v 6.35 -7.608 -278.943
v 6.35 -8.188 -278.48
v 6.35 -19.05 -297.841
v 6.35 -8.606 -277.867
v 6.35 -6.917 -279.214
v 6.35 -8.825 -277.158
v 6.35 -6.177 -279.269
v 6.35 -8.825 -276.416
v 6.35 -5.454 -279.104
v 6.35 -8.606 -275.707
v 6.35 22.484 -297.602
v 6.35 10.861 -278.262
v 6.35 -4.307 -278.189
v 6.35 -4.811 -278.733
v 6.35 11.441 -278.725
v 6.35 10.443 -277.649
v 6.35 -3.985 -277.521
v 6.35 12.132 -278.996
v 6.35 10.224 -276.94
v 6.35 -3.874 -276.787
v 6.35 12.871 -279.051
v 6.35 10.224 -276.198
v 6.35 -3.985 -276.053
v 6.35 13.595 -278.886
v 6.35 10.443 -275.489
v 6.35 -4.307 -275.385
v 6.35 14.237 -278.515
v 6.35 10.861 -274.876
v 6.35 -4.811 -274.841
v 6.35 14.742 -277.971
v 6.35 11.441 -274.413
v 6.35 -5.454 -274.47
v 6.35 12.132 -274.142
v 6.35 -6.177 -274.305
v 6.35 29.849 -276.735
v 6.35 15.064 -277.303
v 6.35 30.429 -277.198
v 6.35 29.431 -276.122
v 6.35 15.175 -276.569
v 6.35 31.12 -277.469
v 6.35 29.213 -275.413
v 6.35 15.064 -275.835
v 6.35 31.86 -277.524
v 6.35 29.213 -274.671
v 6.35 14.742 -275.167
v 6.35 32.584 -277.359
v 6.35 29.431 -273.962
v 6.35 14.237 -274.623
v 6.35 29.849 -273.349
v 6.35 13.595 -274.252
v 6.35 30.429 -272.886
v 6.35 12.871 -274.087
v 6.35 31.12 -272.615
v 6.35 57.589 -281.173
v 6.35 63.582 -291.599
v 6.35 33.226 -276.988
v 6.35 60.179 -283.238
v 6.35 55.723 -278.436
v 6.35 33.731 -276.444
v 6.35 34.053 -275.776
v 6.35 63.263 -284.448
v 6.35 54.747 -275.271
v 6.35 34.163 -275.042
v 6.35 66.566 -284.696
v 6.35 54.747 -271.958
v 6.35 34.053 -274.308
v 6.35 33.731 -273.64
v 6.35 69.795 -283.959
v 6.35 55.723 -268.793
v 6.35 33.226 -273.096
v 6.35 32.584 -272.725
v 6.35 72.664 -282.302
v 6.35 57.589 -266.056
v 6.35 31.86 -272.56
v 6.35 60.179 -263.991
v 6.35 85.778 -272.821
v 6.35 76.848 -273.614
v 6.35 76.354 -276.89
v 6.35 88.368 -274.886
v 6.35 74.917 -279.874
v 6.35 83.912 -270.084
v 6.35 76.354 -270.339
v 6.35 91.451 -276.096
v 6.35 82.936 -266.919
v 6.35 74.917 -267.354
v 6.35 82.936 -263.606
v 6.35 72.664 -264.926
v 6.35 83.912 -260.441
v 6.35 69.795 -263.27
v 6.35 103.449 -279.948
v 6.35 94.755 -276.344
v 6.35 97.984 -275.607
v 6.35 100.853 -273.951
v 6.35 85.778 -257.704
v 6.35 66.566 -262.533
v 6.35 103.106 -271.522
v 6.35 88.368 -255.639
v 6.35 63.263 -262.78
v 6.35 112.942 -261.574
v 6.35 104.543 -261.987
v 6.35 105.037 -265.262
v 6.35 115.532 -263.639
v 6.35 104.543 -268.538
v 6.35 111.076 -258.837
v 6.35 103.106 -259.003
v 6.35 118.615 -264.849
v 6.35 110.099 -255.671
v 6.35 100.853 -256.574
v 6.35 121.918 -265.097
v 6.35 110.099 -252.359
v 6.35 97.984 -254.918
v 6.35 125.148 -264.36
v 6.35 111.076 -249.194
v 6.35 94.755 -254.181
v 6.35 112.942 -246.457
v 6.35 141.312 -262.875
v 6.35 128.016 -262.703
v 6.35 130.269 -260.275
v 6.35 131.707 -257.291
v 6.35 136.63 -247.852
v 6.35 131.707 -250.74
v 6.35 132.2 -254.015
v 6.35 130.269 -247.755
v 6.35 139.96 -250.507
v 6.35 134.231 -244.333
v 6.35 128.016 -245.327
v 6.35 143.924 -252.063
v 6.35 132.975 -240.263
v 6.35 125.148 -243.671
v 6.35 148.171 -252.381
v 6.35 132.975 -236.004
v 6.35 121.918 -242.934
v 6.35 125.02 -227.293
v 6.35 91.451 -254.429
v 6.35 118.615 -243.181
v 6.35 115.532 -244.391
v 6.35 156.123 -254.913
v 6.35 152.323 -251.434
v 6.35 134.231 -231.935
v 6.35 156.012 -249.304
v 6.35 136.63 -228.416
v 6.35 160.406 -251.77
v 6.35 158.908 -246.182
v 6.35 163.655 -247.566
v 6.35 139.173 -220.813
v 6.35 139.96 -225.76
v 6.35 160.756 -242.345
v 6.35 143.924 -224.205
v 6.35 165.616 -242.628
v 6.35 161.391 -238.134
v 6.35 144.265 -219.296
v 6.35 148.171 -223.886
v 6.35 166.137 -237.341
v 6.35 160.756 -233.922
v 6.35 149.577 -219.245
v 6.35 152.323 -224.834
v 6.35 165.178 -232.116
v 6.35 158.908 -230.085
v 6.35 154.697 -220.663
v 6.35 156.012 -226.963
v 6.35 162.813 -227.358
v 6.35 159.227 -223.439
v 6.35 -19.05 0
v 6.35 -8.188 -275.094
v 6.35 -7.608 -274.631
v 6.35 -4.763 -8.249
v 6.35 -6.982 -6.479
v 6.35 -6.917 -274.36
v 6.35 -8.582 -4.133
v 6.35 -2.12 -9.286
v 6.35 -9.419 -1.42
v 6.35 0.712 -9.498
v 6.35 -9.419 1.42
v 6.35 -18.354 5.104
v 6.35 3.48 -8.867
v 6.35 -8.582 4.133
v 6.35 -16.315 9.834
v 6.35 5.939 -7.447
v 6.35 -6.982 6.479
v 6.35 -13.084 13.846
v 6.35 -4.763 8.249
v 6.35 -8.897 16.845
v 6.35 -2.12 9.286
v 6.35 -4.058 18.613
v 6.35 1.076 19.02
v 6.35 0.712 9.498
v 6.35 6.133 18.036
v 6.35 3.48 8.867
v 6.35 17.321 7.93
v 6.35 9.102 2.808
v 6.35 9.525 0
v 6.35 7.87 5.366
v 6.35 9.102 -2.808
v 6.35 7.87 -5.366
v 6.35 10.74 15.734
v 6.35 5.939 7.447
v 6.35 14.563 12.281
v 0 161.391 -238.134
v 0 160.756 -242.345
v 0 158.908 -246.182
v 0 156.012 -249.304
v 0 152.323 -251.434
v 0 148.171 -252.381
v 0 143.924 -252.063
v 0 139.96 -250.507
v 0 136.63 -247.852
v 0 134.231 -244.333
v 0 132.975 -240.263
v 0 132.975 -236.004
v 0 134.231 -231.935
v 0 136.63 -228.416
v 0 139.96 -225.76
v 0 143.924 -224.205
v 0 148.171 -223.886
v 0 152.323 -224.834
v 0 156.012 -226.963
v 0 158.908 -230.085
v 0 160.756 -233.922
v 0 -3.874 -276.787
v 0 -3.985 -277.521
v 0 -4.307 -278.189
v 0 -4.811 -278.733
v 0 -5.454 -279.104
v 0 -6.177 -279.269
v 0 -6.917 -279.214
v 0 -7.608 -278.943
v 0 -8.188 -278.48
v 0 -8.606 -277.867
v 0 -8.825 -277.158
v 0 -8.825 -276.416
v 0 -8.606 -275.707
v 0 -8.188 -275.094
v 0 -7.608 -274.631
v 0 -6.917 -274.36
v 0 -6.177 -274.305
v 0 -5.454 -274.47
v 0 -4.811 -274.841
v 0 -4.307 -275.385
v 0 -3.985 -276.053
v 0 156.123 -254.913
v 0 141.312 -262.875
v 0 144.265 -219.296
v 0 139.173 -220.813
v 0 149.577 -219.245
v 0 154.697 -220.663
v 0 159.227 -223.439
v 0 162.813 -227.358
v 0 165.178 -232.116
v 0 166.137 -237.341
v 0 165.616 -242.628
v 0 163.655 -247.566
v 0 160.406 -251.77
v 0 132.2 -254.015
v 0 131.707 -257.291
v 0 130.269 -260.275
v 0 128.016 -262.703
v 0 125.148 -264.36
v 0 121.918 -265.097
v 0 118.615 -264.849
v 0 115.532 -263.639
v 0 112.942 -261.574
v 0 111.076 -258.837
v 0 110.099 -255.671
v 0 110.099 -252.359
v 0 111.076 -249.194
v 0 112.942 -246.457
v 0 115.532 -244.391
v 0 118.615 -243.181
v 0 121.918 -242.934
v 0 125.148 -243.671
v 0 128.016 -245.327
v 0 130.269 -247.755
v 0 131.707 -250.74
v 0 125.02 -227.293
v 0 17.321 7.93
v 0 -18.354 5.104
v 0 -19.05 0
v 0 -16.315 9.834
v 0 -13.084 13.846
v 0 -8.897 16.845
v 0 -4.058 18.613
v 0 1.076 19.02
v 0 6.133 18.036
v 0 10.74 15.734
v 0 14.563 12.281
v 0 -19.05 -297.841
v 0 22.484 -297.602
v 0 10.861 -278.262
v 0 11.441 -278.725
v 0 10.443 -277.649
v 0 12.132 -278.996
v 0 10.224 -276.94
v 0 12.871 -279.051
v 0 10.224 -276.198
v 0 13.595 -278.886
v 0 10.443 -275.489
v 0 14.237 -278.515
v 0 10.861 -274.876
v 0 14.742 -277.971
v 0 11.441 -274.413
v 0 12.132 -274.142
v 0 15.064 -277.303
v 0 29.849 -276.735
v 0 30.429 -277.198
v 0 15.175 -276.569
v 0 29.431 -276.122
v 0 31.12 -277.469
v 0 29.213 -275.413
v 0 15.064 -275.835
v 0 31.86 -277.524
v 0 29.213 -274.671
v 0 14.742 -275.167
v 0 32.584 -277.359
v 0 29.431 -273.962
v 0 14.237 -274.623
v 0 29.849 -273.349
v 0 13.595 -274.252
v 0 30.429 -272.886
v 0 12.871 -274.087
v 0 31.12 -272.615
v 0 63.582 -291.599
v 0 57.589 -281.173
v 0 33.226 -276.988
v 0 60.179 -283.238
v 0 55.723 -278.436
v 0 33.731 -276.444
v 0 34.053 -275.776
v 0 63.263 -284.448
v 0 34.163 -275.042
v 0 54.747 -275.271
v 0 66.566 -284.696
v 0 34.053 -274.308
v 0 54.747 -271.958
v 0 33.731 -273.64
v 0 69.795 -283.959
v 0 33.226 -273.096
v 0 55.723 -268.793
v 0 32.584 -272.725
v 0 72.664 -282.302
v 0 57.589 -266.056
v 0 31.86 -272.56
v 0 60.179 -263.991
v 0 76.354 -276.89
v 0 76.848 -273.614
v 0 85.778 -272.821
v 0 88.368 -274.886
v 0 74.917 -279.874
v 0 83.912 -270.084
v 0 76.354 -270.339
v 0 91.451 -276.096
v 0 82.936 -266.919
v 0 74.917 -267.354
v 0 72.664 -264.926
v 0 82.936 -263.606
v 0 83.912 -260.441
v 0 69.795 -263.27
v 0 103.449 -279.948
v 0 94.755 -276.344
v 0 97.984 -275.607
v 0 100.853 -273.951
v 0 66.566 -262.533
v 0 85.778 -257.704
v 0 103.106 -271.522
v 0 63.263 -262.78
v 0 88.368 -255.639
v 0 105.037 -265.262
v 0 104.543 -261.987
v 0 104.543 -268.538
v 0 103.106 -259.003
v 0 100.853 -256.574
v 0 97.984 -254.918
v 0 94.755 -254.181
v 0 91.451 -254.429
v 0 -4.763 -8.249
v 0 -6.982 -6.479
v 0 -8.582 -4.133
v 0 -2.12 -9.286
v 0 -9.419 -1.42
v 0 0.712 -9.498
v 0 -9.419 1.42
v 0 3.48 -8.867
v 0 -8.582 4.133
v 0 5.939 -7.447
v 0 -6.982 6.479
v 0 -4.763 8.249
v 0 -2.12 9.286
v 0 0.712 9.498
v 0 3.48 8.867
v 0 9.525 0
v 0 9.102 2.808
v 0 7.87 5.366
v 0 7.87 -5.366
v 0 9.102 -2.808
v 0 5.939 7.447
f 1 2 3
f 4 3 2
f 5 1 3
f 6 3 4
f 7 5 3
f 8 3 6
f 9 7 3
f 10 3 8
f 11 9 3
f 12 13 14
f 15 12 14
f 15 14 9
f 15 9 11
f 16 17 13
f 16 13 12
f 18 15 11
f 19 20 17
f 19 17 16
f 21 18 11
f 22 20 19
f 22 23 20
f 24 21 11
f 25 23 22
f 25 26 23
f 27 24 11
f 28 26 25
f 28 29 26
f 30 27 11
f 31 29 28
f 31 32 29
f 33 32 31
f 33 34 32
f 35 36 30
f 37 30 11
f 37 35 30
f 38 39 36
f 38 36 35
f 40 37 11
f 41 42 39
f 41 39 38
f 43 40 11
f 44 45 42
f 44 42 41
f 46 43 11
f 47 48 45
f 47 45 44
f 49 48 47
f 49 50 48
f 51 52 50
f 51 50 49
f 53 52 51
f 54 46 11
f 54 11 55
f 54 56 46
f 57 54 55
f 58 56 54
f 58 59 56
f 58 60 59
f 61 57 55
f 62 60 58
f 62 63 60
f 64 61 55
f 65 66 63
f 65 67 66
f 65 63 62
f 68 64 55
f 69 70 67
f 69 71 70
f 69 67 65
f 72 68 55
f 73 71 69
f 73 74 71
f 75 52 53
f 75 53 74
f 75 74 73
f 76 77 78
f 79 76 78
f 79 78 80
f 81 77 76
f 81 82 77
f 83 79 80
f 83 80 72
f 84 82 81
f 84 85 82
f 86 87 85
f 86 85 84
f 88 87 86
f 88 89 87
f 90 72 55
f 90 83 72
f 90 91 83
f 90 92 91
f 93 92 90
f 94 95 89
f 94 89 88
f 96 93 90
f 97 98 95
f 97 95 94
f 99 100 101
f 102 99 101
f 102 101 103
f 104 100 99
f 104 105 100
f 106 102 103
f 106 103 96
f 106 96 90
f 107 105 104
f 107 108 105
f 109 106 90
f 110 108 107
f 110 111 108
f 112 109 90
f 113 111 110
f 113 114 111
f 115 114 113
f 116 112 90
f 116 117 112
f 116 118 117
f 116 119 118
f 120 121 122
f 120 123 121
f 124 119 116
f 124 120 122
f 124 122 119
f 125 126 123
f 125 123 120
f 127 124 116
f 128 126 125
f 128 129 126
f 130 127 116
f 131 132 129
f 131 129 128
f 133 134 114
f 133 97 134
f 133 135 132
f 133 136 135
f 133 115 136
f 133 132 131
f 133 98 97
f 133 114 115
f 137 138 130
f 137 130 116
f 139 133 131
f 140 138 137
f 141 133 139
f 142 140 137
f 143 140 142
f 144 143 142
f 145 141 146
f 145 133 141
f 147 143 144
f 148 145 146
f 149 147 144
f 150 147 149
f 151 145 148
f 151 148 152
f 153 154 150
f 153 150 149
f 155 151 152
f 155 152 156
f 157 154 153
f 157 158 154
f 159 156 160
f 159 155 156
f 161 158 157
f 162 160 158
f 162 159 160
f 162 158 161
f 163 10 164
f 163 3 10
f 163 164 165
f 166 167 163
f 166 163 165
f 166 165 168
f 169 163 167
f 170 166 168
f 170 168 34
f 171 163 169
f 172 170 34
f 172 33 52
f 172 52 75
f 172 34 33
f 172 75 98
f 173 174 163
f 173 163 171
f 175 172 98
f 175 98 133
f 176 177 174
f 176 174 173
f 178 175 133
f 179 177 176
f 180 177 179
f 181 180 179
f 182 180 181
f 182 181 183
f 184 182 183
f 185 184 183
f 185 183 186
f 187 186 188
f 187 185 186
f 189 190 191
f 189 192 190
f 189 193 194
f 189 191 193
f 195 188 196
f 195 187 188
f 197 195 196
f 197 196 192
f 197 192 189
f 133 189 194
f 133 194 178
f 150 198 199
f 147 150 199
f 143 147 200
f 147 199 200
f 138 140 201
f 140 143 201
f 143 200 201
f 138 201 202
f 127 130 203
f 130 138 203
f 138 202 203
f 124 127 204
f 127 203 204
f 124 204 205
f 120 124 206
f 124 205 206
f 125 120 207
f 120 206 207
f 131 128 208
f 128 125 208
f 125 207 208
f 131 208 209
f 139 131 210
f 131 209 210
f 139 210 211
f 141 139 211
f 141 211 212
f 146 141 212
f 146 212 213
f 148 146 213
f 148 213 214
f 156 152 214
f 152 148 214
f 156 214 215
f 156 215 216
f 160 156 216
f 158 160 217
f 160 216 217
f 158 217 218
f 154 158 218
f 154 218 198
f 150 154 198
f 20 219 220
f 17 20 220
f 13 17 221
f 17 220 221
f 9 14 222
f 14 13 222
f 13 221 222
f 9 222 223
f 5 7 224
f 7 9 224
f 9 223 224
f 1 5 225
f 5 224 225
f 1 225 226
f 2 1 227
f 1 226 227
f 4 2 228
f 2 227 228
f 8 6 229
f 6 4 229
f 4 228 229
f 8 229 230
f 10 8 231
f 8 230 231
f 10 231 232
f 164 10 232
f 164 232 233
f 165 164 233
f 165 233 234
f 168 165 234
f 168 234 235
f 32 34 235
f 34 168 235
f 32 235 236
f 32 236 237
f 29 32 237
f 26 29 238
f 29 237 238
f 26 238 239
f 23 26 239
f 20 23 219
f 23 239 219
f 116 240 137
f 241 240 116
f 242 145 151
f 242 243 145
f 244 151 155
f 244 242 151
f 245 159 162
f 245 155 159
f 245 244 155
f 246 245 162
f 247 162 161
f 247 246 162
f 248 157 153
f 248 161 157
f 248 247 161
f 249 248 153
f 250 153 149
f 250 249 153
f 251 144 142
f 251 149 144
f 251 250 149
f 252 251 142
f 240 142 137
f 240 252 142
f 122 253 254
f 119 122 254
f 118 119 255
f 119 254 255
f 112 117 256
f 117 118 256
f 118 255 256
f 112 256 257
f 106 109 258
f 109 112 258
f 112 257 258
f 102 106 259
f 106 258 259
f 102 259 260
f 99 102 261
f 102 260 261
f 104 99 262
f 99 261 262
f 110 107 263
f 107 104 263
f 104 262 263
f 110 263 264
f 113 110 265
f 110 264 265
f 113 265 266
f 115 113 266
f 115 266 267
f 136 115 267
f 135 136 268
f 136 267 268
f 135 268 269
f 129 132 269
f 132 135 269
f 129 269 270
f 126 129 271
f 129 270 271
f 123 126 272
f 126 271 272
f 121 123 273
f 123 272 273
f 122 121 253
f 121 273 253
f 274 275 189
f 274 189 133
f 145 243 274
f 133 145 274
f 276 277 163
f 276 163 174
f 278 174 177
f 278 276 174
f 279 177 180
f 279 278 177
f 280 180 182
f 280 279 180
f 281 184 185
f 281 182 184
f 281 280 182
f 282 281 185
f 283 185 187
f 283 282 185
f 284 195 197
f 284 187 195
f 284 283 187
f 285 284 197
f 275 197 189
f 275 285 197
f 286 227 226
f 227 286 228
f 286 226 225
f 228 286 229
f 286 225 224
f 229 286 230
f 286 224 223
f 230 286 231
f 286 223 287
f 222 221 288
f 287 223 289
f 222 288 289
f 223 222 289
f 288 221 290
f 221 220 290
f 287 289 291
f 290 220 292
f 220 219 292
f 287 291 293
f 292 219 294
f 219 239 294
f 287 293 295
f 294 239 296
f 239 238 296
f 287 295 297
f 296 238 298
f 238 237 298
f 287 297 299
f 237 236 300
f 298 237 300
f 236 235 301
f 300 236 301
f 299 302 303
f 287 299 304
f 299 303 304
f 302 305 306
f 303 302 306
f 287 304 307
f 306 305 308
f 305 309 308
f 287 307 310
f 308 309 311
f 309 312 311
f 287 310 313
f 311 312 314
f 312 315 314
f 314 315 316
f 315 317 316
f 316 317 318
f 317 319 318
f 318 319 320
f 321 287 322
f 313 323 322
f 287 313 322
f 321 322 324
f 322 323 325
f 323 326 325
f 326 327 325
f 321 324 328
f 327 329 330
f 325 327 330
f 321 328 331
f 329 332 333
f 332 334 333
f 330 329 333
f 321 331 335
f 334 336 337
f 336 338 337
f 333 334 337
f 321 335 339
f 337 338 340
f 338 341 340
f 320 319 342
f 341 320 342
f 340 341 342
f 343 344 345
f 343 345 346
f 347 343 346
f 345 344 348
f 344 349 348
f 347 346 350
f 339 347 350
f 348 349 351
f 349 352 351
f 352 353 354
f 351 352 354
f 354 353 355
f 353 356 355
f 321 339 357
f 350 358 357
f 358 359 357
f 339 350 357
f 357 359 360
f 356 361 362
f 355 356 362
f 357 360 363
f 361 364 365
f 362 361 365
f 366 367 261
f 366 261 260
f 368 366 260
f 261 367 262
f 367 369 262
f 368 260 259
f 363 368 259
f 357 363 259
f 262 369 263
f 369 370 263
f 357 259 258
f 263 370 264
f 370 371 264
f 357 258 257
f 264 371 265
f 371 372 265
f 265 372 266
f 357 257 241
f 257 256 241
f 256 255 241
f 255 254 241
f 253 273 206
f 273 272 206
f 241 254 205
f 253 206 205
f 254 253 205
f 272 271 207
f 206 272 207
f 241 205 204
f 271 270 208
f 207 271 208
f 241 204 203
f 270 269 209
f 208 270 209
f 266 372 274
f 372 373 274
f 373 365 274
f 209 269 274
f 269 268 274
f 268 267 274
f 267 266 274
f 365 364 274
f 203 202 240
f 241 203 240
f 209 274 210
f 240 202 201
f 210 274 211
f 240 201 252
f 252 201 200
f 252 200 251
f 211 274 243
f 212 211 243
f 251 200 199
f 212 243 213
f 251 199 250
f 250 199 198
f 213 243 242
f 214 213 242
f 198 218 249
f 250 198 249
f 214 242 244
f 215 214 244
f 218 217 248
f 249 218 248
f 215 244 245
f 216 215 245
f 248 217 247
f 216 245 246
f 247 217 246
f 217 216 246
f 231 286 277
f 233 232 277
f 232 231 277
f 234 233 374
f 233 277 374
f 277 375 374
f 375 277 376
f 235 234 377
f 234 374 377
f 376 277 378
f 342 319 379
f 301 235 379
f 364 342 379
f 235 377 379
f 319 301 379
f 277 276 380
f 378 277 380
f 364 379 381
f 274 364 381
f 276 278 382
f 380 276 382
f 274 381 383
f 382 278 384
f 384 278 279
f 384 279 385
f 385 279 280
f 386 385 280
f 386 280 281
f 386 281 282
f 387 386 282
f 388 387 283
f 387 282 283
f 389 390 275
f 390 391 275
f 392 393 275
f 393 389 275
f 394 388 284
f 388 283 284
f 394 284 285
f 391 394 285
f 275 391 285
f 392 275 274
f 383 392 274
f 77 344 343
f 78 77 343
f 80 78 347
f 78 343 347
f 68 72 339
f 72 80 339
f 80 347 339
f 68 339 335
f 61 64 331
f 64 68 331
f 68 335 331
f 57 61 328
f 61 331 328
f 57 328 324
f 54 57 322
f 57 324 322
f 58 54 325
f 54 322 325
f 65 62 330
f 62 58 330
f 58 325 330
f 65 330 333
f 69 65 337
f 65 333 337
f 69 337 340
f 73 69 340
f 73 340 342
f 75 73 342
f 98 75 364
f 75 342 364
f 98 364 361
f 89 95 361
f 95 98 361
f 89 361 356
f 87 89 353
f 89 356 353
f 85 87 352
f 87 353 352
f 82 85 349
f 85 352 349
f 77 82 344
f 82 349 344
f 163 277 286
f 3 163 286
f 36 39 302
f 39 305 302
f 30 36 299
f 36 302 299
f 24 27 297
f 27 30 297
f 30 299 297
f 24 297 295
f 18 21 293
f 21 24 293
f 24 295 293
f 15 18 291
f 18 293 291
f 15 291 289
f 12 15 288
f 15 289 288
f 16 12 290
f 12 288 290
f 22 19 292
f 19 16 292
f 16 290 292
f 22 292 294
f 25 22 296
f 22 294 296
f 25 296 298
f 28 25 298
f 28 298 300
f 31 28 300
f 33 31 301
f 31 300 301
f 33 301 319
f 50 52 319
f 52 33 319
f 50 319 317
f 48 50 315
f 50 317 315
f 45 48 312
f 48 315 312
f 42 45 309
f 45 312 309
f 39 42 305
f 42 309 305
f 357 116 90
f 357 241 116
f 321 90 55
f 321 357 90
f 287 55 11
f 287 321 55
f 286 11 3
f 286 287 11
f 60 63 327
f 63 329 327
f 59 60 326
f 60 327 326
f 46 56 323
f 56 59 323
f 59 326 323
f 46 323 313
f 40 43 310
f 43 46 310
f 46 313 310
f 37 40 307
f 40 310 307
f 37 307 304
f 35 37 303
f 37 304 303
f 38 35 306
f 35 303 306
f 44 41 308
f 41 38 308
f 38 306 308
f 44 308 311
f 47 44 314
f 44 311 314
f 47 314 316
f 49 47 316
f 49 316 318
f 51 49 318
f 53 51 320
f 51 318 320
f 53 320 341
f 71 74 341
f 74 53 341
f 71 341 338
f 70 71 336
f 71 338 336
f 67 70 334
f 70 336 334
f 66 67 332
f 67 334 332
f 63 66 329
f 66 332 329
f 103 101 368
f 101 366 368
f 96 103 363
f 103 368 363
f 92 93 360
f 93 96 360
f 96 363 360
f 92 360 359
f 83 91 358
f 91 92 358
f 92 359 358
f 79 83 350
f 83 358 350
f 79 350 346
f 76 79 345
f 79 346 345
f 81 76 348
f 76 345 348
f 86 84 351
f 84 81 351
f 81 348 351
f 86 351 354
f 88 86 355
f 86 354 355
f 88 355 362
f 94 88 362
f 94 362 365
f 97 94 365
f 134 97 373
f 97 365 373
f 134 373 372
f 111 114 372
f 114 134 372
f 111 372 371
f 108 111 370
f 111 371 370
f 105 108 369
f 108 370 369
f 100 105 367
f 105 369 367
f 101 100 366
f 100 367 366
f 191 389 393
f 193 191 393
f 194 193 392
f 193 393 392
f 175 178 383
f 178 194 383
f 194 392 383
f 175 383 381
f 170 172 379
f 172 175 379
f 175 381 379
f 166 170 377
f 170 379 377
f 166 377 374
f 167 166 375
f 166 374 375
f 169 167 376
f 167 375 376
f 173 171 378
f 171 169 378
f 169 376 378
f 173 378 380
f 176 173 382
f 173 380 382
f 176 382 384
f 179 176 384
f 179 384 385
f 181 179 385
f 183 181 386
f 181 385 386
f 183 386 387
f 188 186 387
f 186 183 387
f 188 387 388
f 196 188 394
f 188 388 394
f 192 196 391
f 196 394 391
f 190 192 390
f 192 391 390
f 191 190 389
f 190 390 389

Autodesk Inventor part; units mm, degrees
ref_plane "YZ Plane" through (0, 0, 0) normal (1, 0, 0) x (0, 1, 0)
ref_plane "XZ Plane" through (0, 0, 0) normal (0, 1, 0) x (-1, 0, 0)
ref_plane "XY Plane" through (0, 0, 0) normal (0, 0, 1) x (1, 0, 0)
sketch "Sketch1" plane through (0, 0, 0) normal (1, 0, 0) x (0, 1, 0)
  circle A0 centre (0, 0) radius 9.525
  arc A1 (-25.1608, -265.5105) -> (128.0642, -233.9411) centre (0, 0) ccw construction
  arc A2 (17.3208, 7.9305) -> (-19.05, 0) centre (0, 0) ccw
  line L0 (-19.05, 0) -> (-19.05, -297.8414)
  circle A3 centre (121.0878, -254.0152) radius 14.7 construction
  circle A4 centre (93.9242, -265.2625) radius 14.7 construction
  circle A5 centre (65.7355, -273.6143) radius 14.7 construction
  circle A6 centre (121.0878, -254.0152) radius 11.1125
  circle A7 centre (93.9242, -265.2625) radius 11.1125
  circle A8 centre (65.7355, -273.6143) radius 11.1125
  circle A9 centre (121.0878, -254.0152) radius 12.7 construction
  circle A10 centre (93.9242, -265.2625) radius 12.7 construction
  circle A11 centre (65.7355, -273.6143) radius 12.7 construction
  line L1 (17.3208, 7.9305) -> (125.0203, -227.293)
  arc A12 (-19.05, -276.2038) -> (132.3042, -243.2017) centre (0, 0) ccw construction
  arc A13 (-19.05, -297.8414) -> (141.312, -262.8751) centre (0, 0) ccw
  circle A14 centre (31.6741, -275.0422) radius 2.4892
  circle A15 centre (12.6854, -276.5692) radius 2.4892
  circle A16 centre (-6.3634, -276.7869) radius 2.4892
  arc A17 (-19.05, -286.3871) -> (136.5435, -252.4606) centre (0, 0) ccw construction
  line L2 (0, 0) -> (8.0964, -266.5771) construction
  line L3 (8.4048, -276.7324) -> (8.7133, -286.8877) construction
  line L4 (8.4048, -276.7324) -> (8.0964, -266.5771) construction
  line L5 (51.0397, -273.9694) -> (31.6741, -275.0422) construction
  line L6 (48.6698, -262.2215) -> (54.4639, -293.4384) construction
  line L7 (48.6698, -262.2215) -> (0, 0) construction
  circle A18 centre (147.1034, -238.1338) radius 14.2875
  arc A19 (156.1233, -254.9131) -> (139.1729, -220.813) centre (147.1034, -238.1338) ccw
  line L8 (139.1729, -220.813) -> (125.0203, -227.293)
  line L9 (128.0642, -233.9411) -> (141.312, -262.8751) construction
  line L10 (125.0203, -227.293) -> (128.0642, -233.9411) construction
  line L11 (156.1233, -254.9131) -> (141.312, -262.8751)
  dimension "d0" = 19.05
  dimension "d1" = 266.7
  dimension "d3" = 22.225
  dimension "d4" = 25.4
  dimension "d5" = 2
  dimension "d8" = 9.525
  dimension "d10" = 31.75
  dimension "d11" = 4.9784
  dimension "d12" = 19.05
  dimension "d13" = 19.05
  dimension "d14" = 12.7
  dimension "d17" = 287.02
  dimension "d19" = 19.05
  dimension "d20" = 28.575
  dimension "d22" = 4.7625
  dimension "d24" = 30.48
extrude "Extrusion1" add sketch "Sketch1" along normal blind 6.35
equation "\"d1\" = BallSize + 0.5 * WheelSize - Compression"
equation "\"BallSize\" = 228.6"
equation "\"WheelSize\" = 101.6"
equation "\"Compression\" = 12.7"
properties part number "Shooter Side"
